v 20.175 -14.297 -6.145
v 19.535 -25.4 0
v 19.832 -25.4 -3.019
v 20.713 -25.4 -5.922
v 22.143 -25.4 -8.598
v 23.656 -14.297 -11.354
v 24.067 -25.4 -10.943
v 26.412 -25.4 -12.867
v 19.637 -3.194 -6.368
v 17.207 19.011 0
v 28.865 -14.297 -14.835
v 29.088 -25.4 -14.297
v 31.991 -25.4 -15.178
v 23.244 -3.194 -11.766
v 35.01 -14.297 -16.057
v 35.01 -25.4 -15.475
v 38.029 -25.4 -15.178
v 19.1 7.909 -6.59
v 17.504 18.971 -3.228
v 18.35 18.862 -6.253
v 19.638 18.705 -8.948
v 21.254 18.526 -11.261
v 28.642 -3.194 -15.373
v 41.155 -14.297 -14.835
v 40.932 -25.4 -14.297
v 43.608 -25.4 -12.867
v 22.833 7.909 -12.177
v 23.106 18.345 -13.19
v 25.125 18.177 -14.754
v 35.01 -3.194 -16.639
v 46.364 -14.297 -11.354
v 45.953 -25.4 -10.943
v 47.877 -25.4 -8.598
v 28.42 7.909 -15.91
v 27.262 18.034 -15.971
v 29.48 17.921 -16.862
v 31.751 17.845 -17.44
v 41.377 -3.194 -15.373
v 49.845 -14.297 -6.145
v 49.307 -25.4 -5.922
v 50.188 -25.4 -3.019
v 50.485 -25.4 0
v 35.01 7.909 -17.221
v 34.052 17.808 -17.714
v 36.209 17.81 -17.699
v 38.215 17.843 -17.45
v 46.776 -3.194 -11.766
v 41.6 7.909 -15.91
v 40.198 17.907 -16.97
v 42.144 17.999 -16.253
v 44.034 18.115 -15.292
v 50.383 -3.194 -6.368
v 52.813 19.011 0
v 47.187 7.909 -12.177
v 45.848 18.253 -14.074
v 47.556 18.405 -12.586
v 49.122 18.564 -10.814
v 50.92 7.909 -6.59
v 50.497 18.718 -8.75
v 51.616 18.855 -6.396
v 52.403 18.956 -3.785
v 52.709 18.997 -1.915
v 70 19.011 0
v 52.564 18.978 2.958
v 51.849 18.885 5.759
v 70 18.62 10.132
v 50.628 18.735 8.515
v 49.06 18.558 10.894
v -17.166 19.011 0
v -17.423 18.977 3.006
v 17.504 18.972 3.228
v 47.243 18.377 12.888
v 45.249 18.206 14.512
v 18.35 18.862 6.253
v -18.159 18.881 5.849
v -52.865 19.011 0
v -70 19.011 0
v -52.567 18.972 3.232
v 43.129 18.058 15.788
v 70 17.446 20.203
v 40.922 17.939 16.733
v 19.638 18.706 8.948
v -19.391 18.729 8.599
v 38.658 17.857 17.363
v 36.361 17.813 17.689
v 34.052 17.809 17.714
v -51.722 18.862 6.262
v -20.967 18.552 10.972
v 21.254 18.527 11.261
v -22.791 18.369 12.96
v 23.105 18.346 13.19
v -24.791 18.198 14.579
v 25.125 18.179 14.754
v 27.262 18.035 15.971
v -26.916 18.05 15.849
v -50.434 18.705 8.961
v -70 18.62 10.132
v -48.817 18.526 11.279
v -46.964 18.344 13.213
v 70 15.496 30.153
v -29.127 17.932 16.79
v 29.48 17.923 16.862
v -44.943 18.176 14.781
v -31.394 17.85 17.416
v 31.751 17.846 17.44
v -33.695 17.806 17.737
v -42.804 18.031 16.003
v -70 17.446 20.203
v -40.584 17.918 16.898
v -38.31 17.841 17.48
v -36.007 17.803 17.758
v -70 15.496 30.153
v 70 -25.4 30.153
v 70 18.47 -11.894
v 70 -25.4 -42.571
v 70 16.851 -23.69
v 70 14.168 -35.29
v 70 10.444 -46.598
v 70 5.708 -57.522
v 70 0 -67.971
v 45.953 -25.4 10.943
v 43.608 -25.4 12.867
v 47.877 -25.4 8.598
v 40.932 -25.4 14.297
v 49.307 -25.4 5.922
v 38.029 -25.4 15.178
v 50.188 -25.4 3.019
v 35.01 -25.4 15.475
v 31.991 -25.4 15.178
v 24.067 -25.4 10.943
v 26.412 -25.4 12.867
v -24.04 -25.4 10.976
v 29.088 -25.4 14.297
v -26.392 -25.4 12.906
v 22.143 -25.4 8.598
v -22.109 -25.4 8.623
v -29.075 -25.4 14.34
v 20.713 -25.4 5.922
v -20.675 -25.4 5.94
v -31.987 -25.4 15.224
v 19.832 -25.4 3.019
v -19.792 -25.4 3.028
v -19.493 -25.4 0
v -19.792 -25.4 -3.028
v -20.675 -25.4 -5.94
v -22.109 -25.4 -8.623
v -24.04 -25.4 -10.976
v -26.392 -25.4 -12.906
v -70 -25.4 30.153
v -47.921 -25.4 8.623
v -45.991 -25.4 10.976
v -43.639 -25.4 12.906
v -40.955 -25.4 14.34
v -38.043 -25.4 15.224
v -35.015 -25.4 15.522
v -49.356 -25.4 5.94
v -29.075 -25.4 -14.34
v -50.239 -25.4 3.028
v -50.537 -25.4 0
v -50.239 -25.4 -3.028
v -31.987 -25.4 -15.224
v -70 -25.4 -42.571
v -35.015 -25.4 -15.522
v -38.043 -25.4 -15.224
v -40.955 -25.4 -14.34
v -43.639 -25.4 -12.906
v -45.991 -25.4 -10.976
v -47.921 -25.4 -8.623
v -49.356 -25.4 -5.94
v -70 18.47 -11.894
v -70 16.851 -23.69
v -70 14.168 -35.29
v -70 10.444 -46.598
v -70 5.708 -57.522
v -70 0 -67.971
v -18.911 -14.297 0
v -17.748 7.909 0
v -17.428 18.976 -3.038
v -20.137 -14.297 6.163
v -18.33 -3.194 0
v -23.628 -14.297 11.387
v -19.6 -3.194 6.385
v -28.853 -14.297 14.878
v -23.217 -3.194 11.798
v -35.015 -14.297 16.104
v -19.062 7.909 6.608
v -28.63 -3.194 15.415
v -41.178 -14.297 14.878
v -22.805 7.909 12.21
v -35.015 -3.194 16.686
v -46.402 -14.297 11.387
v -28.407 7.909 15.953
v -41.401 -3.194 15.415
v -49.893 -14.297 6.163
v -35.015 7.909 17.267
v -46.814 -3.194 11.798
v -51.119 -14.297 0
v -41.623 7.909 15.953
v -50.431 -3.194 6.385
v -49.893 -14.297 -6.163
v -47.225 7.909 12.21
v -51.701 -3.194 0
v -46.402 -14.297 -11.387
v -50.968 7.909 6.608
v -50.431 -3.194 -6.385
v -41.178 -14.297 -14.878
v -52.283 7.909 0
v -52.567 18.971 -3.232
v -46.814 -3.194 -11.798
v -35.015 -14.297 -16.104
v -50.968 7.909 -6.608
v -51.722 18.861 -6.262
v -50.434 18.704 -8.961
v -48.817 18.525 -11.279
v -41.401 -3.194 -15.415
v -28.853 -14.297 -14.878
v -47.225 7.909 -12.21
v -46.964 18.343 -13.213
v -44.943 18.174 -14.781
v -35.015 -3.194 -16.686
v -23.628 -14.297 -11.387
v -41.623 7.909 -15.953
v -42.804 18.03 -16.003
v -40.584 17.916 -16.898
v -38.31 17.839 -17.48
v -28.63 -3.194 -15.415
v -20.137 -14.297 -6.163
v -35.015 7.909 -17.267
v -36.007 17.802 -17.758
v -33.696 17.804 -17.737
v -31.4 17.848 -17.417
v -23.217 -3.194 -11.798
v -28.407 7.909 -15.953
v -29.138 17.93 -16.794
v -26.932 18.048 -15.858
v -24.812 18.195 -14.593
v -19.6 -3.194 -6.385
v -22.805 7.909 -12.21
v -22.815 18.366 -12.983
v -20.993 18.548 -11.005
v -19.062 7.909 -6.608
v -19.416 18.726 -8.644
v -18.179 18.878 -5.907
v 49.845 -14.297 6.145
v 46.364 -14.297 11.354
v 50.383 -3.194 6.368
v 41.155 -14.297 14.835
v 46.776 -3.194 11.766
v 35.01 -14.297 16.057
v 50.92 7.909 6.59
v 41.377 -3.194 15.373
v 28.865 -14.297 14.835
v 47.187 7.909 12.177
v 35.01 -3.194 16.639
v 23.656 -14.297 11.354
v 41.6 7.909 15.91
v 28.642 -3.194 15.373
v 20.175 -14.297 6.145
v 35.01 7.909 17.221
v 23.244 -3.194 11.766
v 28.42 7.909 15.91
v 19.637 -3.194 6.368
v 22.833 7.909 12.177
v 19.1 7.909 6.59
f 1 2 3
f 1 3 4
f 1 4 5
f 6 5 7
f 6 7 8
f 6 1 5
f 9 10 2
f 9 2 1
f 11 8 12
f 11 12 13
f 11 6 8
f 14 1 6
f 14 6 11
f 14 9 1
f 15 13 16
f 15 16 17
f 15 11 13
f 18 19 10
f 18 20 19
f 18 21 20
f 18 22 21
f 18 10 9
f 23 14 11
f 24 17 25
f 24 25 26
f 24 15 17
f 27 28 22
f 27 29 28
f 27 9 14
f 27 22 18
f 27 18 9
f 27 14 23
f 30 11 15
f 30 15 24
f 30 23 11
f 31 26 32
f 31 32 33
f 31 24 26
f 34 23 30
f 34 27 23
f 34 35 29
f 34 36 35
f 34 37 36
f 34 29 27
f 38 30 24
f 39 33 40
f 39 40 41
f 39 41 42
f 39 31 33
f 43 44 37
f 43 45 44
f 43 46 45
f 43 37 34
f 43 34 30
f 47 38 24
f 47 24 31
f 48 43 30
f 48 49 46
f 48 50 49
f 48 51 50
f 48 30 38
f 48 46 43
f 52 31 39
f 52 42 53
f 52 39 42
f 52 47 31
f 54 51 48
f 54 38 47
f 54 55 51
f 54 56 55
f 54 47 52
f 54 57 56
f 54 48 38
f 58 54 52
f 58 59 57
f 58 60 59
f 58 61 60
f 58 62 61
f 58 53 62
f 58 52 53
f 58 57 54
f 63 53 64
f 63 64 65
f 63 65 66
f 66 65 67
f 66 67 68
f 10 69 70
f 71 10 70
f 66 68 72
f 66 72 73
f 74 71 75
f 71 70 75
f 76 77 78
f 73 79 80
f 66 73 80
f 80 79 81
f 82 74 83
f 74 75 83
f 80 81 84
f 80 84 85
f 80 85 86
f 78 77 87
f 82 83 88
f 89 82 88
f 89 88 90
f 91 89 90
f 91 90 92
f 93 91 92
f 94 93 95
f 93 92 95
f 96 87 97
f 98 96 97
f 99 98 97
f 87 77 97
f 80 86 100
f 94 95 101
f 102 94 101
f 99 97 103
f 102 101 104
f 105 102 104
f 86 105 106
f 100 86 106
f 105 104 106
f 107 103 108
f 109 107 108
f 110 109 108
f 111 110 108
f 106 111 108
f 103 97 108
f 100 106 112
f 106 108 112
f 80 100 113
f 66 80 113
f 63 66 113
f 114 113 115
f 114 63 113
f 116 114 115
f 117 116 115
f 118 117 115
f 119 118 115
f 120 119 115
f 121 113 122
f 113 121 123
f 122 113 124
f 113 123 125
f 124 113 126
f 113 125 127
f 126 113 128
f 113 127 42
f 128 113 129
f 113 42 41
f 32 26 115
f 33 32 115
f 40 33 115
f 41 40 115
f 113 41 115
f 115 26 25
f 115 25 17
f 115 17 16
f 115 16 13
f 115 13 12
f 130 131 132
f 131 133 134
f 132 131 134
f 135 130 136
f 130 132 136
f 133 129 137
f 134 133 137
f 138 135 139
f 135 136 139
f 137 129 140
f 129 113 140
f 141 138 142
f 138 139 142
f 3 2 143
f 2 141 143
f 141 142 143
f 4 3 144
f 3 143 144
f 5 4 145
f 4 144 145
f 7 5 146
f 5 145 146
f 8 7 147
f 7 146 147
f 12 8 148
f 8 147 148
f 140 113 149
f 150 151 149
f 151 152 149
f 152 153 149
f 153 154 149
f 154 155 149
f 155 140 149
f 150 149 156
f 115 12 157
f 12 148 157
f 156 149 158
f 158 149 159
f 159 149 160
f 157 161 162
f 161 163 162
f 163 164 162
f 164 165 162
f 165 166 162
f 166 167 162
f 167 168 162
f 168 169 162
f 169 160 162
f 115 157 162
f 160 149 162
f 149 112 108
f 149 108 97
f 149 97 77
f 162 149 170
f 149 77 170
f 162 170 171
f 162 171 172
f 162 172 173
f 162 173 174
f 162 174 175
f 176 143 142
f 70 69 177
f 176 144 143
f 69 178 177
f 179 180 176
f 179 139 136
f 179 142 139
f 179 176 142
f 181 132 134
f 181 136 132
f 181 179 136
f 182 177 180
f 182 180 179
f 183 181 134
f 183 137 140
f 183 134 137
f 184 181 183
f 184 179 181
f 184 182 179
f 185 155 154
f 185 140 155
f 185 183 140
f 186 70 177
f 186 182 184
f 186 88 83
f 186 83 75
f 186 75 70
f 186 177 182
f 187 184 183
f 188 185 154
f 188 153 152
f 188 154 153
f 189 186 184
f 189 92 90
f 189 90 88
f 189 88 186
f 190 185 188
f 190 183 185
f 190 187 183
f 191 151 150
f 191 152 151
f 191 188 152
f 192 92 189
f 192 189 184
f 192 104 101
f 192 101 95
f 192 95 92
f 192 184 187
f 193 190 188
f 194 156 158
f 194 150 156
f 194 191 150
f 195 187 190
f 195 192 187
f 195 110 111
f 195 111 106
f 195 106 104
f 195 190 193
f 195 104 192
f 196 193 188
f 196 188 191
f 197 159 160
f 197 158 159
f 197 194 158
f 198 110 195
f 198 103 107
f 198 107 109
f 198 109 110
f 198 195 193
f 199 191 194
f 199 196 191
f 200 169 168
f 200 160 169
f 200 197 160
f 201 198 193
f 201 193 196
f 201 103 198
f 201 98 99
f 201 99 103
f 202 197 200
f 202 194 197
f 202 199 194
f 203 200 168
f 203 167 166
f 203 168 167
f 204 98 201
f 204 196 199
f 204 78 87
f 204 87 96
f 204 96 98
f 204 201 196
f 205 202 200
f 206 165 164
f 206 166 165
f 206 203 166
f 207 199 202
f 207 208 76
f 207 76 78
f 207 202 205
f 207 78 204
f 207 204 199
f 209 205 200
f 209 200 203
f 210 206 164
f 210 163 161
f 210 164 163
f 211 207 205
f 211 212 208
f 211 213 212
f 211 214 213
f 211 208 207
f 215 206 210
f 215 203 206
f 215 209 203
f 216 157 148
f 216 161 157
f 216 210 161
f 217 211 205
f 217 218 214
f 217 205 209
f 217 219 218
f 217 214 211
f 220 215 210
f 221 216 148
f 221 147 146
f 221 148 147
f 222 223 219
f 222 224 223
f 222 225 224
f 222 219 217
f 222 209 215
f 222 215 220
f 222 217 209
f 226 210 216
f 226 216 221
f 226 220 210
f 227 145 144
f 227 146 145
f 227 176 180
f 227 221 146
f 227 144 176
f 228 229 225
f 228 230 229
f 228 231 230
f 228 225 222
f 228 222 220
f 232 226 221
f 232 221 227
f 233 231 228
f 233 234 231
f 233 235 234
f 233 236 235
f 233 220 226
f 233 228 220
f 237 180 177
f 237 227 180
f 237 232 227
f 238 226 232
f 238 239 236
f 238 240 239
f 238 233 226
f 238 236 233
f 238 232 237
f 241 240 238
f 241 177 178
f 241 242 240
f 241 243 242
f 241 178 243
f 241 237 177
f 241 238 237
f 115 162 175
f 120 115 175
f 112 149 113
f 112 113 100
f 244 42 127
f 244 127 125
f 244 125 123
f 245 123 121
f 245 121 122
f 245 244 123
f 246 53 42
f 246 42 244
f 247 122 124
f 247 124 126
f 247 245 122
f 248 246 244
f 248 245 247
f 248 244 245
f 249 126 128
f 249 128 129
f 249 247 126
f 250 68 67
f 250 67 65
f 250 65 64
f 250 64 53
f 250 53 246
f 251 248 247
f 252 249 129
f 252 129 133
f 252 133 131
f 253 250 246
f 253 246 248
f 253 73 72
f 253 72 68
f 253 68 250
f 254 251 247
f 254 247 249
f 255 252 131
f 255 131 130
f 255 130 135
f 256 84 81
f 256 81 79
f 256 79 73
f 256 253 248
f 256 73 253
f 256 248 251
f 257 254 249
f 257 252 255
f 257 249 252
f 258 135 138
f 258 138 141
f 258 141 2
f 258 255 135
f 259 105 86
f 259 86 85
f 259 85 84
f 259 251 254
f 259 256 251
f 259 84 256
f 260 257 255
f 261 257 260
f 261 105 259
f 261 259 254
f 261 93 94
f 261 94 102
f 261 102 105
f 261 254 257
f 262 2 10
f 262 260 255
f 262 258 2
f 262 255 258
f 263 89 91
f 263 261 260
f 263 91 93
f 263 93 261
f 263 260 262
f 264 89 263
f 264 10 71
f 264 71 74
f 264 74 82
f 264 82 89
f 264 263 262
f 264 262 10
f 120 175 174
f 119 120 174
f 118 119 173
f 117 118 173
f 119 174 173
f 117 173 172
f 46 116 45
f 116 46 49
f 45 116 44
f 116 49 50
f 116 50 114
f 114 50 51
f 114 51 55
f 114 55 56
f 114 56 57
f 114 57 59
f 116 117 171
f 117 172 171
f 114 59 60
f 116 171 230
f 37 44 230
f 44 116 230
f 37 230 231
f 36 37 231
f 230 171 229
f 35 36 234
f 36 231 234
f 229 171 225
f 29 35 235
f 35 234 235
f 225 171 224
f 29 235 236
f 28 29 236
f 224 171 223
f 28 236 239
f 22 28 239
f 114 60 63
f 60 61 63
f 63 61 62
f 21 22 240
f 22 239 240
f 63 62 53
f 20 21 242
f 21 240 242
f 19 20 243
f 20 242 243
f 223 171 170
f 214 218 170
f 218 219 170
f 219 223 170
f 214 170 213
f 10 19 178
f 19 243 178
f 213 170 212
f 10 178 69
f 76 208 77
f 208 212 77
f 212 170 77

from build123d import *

# Parameters (mm, degrees)
F2_DEPTH  = 140
F3_DEPTH  = 25.4
F6_W      = 215.1558175683
F6_H      = 84.3175165355
F7_DEPTH  = 140.001
F9_DEPTH  = 140.001
F5_R      = 15.5218481215
F10_DEPTH = 44.4123579555
F10_TAPER = -3


with BuildPart() as f2:
    # F1 (on offset) → F2 (new body)
    with BuildSketch(Plane.YZ.offset(-70)):
        with BuildLine():
            Line((0, 67.9838731885), (0, 0))
            Line((0, 0), (19.0113577992, 0))
            ThreePointArc((19.0113577992, 0), (14.1699092565, 35.2962658126), (0, 67.9838731885))
        make_face()
        with BuildLine():
            Line((19.0113577992, 0), (0, 0))
            Line((0, 0), (0, -67.971073091))
            ThreePointArc((0, -67.971073091), (14.1681854898, -35.2896292573), (19.0113577992, 0))
        make_face()
    extrude(amount=F2_DEPTH)

    # F3 (add): a face of the model
    f3_faces = [f2.faces().sort_by_distance(p)[0] for p in [
        (0, 0, 0.0064000487),
    ]]
    extrude(f3_faces, amount=F3_DEPTH)

    # F6 (on offset) → F7 (cut, through all)
    with BuildSketch(Plane.YZ.offset(-70)):
        with Locations((27.4681784213, 72.3114386201)):
            Rectangle(F6_W, F6_H)
    extrude(amount=F7_DEPTH, mode=Mode.SUBTRACT)

    # F8 (on face) → F9 (cut, through all)
    with BuildSketch(Plane(origin=(-70, 0, 0), x_dir=(0, -1, 0), z_dir=(-1, 0, 0))):
        Polygon((0, -67.971073091), (25.4, -67.971073091), (25.4, -42.571246624), align=None)
    extrude(amount=-F9_DEPTH, mode=Mode.SUBTRACT)

    # F5 (on face) → F10 (cut, through all)
    with BuildSketch(Plane.XZ.offset(25.4)):
        with Locations((-35.0152216852, 0)):
            Circle(F5_R)
        with BuildLine():
            ThreePointArc((50.4853369025, 0), (35.0099764764, 15.4753604261), (19.5346160504, 0))
            ThreePointArc((19.5346160504, 0), (35.0099764764, -15.4753604261), (50.4853369025, 0))
        make_face()
    extrude(amount=-F10_DEPTH, taper=F10_TAPER, mode=Mode.SUBTRACT)


solid = f2.part
